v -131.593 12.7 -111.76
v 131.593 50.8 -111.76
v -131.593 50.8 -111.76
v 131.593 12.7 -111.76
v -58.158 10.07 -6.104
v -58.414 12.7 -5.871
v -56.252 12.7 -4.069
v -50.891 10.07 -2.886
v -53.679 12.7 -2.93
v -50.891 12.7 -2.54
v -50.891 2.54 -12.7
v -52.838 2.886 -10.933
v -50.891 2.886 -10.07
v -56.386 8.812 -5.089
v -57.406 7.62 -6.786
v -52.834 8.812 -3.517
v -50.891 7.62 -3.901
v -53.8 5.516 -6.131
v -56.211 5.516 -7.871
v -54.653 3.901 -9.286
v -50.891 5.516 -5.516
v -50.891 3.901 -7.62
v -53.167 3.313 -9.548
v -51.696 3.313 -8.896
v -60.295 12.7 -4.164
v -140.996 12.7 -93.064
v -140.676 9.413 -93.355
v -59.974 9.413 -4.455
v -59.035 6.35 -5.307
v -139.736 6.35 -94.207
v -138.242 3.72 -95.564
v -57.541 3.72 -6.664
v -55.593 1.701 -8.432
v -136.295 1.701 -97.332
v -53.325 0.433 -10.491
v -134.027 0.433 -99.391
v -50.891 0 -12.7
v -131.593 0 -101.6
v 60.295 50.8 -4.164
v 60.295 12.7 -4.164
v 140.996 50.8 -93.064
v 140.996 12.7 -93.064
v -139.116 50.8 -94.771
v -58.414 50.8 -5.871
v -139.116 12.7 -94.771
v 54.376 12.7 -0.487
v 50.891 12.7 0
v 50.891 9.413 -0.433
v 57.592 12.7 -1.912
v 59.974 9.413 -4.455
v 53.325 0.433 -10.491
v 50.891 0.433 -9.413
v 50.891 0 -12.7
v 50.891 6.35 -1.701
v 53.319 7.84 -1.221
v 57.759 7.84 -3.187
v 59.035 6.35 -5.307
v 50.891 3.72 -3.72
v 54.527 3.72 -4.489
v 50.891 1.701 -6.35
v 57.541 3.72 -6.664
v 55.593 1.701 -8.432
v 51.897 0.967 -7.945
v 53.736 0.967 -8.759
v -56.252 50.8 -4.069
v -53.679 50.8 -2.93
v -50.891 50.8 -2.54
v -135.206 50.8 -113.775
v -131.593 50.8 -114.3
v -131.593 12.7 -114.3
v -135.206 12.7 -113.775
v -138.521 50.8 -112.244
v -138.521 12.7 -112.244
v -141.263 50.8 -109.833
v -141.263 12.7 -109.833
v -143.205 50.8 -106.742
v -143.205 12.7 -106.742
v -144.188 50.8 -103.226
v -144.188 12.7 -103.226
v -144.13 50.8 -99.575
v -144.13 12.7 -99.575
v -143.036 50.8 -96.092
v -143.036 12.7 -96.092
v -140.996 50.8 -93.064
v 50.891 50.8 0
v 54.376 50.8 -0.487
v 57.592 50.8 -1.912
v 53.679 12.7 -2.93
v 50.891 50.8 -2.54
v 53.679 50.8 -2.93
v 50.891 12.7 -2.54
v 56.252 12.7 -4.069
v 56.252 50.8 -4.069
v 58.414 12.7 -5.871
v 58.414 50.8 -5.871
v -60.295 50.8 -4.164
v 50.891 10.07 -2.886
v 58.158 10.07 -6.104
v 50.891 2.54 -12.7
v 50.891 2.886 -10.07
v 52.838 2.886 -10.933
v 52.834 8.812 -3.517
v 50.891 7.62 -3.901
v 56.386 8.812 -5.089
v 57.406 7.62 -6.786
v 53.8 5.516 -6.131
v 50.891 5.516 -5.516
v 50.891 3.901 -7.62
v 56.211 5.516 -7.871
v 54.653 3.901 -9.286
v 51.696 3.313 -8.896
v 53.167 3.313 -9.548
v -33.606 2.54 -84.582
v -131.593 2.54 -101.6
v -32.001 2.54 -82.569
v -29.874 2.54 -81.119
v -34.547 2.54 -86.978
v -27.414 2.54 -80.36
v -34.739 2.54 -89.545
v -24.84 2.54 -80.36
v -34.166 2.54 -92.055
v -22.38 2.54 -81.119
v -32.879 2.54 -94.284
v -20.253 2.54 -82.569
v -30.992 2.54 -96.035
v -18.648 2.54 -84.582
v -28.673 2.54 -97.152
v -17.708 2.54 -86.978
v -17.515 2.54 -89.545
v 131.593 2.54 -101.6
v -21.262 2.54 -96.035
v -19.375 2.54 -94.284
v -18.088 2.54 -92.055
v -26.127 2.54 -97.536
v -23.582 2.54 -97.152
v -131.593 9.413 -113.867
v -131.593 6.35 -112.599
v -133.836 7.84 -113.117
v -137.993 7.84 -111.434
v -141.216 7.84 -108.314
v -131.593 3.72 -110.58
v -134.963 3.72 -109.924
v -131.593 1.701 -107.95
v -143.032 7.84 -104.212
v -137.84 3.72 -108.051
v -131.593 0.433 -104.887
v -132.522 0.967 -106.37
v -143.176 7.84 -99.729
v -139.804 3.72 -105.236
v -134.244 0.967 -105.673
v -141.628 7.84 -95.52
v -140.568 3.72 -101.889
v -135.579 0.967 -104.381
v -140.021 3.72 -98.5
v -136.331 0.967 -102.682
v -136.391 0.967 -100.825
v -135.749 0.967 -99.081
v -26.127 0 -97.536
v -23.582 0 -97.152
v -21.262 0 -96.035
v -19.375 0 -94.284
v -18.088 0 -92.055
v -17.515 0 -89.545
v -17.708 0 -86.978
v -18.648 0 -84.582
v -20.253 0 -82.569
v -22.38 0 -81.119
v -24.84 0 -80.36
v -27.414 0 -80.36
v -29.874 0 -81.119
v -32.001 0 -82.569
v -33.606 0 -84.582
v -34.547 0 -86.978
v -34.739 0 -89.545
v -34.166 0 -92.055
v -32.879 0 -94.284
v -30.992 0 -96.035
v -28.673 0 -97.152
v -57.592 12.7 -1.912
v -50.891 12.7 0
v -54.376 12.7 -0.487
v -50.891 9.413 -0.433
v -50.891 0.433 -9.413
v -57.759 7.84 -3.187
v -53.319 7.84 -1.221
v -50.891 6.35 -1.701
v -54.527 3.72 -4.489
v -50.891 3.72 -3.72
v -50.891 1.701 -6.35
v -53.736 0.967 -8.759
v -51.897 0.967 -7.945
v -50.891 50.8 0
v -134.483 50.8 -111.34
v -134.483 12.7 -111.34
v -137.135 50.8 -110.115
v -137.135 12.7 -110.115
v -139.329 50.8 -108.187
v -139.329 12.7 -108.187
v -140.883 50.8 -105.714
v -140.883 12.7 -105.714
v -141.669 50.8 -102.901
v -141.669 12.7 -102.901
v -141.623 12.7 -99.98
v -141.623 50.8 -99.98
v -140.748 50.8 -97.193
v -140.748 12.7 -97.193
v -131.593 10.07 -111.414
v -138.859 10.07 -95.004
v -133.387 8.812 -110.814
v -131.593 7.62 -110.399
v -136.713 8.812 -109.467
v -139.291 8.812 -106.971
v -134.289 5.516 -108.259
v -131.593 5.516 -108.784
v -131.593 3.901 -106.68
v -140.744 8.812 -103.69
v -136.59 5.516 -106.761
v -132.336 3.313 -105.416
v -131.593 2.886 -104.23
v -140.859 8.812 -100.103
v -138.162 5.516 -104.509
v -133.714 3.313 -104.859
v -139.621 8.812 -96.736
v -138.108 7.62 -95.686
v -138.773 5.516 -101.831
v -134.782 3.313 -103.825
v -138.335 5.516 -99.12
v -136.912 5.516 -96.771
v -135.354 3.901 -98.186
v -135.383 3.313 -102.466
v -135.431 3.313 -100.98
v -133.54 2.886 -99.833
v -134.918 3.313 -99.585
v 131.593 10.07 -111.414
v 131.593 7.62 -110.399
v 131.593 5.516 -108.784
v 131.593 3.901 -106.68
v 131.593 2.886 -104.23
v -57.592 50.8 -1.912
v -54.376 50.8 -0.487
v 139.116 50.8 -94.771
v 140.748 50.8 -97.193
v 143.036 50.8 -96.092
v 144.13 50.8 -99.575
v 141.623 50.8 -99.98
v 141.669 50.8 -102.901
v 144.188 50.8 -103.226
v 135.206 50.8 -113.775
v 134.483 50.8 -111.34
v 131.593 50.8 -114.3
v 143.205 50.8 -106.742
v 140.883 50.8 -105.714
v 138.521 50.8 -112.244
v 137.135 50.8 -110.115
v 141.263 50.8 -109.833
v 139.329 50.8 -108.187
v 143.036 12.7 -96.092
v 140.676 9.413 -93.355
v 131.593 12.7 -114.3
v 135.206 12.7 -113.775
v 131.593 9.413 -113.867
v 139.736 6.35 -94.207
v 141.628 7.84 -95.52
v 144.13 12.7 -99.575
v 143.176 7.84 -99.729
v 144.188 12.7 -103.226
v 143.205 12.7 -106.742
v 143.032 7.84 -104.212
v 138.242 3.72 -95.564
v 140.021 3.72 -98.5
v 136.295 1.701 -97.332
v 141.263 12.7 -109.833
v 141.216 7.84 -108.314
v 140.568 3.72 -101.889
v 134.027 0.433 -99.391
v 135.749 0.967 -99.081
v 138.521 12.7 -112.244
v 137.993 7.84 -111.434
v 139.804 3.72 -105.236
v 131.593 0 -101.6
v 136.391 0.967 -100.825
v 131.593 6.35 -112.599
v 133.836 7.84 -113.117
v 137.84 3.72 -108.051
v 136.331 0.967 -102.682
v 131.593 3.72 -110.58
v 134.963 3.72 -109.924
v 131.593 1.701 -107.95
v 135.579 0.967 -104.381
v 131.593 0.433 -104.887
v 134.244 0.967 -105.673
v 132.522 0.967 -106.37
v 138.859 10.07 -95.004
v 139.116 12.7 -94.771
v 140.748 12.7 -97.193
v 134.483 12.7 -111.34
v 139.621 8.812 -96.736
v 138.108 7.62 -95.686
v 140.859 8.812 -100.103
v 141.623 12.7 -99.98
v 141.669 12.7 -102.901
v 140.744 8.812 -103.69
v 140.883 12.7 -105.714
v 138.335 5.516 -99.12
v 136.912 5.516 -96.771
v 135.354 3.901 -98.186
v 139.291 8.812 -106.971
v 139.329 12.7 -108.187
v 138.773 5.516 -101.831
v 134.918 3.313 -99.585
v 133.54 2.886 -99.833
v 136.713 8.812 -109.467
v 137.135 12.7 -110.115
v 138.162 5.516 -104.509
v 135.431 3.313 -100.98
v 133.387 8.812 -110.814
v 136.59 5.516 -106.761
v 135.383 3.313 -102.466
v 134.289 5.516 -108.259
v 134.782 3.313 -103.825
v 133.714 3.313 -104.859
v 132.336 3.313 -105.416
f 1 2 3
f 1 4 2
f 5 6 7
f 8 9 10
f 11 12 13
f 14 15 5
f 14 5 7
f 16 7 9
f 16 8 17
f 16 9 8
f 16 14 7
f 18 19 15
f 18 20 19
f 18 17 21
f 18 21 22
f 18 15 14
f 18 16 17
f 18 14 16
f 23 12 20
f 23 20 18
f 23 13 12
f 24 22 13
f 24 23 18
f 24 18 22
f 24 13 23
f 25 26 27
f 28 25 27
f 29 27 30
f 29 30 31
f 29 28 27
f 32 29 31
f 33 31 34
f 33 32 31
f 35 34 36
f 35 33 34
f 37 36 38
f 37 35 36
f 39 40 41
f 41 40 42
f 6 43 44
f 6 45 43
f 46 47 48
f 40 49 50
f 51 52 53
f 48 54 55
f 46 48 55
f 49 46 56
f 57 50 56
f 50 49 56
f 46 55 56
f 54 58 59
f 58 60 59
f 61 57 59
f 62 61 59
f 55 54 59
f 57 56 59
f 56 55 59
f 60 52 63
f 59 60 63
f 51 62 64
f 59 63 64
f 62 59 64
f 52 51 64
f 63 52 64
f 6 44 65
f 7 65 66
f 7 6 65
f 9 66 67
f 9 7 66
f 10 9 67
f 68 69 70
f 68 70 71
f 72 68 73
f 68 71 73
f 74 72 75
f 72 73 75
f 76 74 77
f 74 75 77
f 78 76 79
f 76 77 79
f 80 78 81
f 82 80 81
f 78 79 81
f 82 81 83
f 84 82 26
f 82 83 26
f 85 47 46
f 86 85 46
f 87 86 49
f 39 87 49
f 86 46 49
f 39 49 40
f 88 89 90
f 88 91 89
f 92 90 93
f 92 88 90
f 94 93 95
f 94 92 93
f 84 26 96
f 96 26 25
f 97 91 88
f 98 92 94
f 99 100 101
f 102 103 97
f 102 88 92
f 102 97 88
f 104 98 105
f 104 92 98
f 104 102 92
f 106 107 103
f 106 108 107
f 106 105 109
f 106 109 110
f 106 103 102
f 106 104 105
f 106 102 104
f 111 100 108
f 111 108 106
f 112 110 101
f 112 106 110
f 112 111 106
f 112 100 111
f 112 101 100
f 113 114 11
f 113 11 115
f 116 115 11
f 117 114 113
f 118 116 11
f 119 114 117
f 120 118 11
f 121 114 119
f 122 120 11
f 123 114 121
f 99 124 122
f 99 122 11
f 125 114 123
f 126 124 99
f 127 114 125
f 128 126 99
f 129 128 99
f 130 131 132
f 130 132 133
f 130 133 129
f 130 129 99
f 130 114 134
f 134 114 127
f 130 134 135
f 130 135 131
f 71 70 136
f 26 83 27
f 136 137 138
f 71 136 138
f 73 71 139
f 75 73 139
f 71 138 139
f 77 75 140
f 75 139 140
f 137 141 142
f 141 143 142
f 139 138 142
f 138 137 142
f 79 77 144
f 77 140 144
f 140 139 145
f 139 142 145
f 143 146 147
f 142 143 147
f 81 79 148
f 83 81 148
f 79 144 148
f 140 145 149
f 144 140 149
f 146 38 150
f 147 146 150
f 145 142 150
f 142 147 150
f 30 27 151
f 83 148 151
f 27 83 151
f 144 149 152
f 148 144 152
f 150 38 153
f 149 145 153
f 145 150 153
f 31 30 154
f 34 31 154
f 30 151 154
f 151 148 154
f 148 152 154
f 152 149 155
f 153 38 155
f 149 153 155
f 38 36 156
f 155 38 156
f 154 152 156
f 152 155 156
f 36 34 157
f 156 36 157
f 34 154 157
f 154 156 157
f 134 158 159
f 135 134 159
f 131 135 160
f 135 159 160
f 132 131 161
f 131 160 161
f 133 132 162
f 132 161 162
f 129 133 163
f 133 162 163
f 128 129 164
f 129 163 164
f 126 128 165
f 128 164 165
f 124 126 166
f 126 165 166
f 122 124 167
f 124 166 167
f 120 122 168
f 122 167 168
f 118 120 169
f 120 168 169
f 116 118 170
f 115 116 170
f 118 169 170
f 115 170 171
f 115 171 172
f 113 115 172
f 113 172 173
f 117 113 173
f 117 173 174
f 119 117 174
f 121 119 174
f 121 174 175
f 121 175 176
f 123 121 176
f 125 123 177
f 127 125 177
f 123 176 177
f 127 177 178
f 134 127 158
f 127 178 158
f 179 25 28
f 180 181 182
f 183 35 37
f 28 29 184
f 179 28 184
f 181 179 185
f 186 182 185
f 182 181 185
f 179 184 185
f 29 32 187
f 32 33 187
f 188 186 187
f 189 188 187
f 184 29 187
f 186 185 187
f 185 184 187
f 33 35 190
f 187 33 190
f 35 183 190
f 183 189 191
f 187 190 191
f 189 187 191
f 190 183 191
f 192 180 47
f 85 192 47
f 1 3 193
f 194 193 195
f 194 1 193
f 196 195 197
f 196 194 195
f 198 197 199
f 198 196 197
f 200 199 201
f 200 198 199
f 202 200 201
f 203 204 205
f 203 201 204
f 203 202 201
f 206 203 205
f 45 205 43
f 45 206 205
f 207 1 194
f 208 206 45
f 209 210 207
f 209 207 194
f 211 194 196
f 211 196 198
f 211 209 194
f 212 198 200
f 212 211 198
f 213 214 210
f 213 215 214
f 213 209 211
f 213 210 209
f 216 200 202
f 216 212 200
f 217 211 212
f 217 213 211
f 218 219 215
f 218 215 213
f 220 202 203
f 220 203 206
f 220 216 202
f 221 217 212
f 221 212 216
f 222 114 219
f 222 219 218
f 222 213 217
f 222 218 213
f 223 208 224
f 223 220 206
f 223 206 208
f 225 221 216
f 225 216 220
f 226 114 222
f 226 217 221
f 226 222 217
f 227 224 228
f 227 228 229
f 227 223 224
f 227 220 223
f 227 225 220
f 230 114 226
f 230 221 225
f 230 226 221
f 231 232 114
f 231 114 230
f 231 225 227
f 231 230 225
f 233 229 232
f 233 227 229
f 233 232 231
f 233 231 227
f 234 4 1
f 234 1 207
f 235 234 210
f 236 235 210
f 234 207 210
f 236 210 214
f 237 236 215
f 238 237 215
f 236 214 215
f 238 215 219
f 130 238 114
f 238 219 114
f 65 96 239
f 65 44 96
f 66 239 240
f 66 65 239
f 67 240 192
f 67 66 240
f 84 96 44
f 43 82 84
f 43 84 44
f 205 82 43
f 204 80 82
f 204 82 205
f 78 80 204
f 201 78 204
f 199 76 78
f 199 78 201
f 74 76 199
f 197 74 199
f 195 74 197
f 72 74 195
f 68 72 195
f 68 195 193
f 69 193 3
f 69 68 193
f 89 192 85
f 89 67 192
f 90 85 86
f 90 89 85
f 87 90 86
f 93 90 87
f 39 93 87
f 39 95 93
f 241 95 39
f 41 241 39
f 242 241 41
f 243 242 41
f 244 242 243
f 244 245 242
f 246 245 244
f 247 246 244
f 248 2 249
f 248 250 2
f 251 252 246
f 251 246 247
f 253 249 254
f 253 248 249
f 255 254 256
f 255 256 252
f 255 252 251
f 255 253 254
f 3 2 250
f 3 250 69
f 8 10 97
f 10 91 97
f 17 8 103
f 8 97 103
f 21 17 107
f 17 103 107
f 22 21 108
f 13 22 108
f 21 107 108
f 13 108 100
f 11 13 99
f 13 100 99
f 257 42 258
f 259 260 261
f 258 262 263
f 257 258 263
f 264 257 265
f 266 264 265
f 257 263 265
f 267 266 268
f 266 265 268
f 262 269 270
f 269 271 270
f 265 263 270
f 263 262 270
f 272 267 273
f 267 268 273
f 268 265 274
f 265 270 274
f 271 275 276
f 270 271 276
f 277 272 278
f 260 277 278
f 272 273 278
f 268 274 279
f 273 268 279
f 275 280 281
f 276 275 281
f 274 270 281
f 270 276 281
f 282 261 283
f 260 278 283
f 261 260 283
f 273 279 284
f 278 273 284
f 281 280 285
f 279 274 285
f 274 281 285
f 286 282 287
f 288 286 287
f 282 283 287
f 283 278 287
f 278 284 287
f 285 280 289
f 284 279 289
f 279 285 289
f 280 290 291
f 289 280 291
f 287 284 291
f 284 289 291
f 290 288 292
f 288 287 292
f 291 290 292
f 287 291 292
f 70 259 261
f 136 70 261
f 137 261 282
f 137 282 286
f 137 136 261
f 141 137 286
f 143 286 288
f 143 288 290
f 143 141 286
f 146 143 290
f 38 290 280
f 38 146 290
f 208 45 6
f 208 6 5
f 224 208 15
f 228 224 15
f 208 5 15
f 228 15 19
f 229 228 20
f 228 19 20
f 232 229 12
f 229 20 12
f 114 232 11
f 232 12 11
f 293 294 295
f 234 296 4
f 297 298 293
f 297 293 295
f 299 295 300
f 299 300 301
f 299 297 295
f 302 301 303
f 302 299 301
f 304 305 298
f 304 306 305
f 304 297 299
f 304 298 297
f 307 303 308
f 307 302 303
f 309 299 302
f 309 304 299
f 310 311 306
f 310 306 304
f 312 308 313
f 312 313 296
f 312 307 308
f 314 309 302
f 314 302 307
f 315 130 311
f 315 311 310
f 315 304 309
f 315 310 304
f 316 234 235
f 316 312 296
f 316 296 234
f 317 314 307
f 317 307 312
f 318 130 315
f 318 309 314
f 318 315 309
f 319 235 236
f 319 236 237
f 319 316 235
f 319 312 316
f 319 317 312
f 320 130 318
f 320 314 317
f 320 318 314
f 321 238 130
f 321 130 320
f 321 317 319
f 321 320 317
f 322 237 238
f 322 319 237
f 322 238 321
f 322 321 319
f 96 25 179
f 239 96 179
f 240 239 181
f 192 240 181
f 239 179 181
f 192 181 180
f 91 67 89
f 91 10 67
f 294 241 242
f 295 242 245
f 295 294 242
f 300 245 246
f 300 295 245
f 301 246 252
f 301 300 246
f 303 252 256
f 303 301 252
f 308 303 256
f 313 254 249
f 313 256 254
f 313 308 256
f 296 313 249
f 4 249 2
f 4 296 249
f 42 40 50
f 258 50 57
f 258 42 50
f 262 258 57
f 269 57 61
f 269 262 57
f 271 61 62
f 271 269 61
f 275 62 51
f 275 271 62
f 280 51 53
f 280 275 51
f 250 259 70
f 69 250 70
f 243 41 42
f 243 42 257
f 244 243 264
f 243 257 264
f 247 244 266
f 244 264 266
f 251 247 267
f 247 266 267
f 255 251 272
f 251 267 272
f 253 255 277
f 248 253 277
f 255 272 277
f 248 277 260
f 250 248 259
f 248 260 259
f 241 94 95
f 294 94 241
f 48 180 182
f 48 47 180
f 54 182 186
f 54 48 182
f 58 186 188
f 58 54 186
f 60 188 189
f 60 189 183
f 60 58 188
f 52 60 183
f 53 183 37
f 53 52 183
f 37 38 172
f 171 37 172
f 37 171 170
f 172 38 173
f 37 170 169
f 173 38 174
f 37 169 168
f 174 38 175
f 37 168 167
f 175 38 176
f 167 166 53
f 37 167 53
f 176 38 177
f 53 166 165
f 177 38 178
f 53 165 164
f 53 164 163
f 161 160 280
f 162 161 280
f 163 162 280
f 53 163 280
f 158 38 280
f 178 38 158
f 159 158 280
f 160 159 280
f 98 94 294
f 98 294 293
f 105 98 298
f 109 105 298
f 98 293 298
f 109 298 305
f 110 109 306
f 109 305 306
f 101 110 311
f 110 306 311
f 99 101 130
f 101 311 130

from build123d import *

# Parameters (mm, degrees)
BOSS_EXTRUDE1_DEPTH = 50.8
FILLET1_R           = 12.7
SHELL1_T            = -2.54
SKETCH2_R           = 8.636
CUT_EXTRUDE1_DEPTH  = 2.54


with BuildPart() as part:
    # Sketch1 → Boss-Extrude1 (new body)
    with BuildSketch(Plane(origin=(0, 0, 0), x_dir=(1, 0, 0), z_dir=(0, 1, 0))):
        with BuildLine():
            Line((-50.891439248, 0), (50.891439248, 0))
            ThreePointArc((50.891439248, 0), (56.033447259, 1.087517336), (60.29482175, 4.163818329))
            Line((60.29482175, 4.163818329), (140.996266194, 93.063818329))
            ThreePointArc((140.996266194, 93.063818329), (143.205366356, 106.742008011), (131.592883692, 114.3))
            Line((131.592883692, 114.3), (-131.592883692, 114.3))
            ThreePointArc((-131.592883692, 114.3), (-143.205366356, 106.742008011), (-140.996266194, 93.063818329))
            Line((-140.996266194, 93.063818329), (-60.29482175, 4.163818329))
            ThreePointArc((-60.29482175, 4.163818329), (-56.033447259, 1.087517336), (-50.891439248, 0))
        make_face()
    extrude(amount=BOSS_EXTRUDE1_DEPTH)

    # Fillet1
    fillet1_edges = [part.edges().sort_by_distance(p)[0] for p in [
        (-56.033447259, 0, -1.087517336),
        (0, 0, 0),
        (56.033447259, 0, -1.087517336),
        (100.645543972, 0, -48.613818329),
        (143.205366356, 0, -106.742008011),
        (0, 0, -114.3),
        (-143.205366356, 0, -106.742008011),
        (-100.645543972, 0, -48.613818329),
    ]]
    fillet(fillet1_edges, radius=FILLET1_R)

    # Shell1
    shell1_openings = [part.faces().sort_by_distance(p)[0] for p in [
        (0, 50.8, -65.668899596),
    ]]
    offset(amount=SHELL1_T, openings=shell1_openings, kind=Kind.INTERSECTION)

    # Sketch2 → Cut-Extrude1 (cut)
    with BuildSketch(Plane.XZ):
        with Locations(Location((-26.127205075, -88.9, 0), (0, 0, 270))):
            Circle(SKETCH2_R)
    extrude(amount=-CUT_EXTRUDE1_DEPTH, mode=Mode.SUBTRACT)


solid = part.part
